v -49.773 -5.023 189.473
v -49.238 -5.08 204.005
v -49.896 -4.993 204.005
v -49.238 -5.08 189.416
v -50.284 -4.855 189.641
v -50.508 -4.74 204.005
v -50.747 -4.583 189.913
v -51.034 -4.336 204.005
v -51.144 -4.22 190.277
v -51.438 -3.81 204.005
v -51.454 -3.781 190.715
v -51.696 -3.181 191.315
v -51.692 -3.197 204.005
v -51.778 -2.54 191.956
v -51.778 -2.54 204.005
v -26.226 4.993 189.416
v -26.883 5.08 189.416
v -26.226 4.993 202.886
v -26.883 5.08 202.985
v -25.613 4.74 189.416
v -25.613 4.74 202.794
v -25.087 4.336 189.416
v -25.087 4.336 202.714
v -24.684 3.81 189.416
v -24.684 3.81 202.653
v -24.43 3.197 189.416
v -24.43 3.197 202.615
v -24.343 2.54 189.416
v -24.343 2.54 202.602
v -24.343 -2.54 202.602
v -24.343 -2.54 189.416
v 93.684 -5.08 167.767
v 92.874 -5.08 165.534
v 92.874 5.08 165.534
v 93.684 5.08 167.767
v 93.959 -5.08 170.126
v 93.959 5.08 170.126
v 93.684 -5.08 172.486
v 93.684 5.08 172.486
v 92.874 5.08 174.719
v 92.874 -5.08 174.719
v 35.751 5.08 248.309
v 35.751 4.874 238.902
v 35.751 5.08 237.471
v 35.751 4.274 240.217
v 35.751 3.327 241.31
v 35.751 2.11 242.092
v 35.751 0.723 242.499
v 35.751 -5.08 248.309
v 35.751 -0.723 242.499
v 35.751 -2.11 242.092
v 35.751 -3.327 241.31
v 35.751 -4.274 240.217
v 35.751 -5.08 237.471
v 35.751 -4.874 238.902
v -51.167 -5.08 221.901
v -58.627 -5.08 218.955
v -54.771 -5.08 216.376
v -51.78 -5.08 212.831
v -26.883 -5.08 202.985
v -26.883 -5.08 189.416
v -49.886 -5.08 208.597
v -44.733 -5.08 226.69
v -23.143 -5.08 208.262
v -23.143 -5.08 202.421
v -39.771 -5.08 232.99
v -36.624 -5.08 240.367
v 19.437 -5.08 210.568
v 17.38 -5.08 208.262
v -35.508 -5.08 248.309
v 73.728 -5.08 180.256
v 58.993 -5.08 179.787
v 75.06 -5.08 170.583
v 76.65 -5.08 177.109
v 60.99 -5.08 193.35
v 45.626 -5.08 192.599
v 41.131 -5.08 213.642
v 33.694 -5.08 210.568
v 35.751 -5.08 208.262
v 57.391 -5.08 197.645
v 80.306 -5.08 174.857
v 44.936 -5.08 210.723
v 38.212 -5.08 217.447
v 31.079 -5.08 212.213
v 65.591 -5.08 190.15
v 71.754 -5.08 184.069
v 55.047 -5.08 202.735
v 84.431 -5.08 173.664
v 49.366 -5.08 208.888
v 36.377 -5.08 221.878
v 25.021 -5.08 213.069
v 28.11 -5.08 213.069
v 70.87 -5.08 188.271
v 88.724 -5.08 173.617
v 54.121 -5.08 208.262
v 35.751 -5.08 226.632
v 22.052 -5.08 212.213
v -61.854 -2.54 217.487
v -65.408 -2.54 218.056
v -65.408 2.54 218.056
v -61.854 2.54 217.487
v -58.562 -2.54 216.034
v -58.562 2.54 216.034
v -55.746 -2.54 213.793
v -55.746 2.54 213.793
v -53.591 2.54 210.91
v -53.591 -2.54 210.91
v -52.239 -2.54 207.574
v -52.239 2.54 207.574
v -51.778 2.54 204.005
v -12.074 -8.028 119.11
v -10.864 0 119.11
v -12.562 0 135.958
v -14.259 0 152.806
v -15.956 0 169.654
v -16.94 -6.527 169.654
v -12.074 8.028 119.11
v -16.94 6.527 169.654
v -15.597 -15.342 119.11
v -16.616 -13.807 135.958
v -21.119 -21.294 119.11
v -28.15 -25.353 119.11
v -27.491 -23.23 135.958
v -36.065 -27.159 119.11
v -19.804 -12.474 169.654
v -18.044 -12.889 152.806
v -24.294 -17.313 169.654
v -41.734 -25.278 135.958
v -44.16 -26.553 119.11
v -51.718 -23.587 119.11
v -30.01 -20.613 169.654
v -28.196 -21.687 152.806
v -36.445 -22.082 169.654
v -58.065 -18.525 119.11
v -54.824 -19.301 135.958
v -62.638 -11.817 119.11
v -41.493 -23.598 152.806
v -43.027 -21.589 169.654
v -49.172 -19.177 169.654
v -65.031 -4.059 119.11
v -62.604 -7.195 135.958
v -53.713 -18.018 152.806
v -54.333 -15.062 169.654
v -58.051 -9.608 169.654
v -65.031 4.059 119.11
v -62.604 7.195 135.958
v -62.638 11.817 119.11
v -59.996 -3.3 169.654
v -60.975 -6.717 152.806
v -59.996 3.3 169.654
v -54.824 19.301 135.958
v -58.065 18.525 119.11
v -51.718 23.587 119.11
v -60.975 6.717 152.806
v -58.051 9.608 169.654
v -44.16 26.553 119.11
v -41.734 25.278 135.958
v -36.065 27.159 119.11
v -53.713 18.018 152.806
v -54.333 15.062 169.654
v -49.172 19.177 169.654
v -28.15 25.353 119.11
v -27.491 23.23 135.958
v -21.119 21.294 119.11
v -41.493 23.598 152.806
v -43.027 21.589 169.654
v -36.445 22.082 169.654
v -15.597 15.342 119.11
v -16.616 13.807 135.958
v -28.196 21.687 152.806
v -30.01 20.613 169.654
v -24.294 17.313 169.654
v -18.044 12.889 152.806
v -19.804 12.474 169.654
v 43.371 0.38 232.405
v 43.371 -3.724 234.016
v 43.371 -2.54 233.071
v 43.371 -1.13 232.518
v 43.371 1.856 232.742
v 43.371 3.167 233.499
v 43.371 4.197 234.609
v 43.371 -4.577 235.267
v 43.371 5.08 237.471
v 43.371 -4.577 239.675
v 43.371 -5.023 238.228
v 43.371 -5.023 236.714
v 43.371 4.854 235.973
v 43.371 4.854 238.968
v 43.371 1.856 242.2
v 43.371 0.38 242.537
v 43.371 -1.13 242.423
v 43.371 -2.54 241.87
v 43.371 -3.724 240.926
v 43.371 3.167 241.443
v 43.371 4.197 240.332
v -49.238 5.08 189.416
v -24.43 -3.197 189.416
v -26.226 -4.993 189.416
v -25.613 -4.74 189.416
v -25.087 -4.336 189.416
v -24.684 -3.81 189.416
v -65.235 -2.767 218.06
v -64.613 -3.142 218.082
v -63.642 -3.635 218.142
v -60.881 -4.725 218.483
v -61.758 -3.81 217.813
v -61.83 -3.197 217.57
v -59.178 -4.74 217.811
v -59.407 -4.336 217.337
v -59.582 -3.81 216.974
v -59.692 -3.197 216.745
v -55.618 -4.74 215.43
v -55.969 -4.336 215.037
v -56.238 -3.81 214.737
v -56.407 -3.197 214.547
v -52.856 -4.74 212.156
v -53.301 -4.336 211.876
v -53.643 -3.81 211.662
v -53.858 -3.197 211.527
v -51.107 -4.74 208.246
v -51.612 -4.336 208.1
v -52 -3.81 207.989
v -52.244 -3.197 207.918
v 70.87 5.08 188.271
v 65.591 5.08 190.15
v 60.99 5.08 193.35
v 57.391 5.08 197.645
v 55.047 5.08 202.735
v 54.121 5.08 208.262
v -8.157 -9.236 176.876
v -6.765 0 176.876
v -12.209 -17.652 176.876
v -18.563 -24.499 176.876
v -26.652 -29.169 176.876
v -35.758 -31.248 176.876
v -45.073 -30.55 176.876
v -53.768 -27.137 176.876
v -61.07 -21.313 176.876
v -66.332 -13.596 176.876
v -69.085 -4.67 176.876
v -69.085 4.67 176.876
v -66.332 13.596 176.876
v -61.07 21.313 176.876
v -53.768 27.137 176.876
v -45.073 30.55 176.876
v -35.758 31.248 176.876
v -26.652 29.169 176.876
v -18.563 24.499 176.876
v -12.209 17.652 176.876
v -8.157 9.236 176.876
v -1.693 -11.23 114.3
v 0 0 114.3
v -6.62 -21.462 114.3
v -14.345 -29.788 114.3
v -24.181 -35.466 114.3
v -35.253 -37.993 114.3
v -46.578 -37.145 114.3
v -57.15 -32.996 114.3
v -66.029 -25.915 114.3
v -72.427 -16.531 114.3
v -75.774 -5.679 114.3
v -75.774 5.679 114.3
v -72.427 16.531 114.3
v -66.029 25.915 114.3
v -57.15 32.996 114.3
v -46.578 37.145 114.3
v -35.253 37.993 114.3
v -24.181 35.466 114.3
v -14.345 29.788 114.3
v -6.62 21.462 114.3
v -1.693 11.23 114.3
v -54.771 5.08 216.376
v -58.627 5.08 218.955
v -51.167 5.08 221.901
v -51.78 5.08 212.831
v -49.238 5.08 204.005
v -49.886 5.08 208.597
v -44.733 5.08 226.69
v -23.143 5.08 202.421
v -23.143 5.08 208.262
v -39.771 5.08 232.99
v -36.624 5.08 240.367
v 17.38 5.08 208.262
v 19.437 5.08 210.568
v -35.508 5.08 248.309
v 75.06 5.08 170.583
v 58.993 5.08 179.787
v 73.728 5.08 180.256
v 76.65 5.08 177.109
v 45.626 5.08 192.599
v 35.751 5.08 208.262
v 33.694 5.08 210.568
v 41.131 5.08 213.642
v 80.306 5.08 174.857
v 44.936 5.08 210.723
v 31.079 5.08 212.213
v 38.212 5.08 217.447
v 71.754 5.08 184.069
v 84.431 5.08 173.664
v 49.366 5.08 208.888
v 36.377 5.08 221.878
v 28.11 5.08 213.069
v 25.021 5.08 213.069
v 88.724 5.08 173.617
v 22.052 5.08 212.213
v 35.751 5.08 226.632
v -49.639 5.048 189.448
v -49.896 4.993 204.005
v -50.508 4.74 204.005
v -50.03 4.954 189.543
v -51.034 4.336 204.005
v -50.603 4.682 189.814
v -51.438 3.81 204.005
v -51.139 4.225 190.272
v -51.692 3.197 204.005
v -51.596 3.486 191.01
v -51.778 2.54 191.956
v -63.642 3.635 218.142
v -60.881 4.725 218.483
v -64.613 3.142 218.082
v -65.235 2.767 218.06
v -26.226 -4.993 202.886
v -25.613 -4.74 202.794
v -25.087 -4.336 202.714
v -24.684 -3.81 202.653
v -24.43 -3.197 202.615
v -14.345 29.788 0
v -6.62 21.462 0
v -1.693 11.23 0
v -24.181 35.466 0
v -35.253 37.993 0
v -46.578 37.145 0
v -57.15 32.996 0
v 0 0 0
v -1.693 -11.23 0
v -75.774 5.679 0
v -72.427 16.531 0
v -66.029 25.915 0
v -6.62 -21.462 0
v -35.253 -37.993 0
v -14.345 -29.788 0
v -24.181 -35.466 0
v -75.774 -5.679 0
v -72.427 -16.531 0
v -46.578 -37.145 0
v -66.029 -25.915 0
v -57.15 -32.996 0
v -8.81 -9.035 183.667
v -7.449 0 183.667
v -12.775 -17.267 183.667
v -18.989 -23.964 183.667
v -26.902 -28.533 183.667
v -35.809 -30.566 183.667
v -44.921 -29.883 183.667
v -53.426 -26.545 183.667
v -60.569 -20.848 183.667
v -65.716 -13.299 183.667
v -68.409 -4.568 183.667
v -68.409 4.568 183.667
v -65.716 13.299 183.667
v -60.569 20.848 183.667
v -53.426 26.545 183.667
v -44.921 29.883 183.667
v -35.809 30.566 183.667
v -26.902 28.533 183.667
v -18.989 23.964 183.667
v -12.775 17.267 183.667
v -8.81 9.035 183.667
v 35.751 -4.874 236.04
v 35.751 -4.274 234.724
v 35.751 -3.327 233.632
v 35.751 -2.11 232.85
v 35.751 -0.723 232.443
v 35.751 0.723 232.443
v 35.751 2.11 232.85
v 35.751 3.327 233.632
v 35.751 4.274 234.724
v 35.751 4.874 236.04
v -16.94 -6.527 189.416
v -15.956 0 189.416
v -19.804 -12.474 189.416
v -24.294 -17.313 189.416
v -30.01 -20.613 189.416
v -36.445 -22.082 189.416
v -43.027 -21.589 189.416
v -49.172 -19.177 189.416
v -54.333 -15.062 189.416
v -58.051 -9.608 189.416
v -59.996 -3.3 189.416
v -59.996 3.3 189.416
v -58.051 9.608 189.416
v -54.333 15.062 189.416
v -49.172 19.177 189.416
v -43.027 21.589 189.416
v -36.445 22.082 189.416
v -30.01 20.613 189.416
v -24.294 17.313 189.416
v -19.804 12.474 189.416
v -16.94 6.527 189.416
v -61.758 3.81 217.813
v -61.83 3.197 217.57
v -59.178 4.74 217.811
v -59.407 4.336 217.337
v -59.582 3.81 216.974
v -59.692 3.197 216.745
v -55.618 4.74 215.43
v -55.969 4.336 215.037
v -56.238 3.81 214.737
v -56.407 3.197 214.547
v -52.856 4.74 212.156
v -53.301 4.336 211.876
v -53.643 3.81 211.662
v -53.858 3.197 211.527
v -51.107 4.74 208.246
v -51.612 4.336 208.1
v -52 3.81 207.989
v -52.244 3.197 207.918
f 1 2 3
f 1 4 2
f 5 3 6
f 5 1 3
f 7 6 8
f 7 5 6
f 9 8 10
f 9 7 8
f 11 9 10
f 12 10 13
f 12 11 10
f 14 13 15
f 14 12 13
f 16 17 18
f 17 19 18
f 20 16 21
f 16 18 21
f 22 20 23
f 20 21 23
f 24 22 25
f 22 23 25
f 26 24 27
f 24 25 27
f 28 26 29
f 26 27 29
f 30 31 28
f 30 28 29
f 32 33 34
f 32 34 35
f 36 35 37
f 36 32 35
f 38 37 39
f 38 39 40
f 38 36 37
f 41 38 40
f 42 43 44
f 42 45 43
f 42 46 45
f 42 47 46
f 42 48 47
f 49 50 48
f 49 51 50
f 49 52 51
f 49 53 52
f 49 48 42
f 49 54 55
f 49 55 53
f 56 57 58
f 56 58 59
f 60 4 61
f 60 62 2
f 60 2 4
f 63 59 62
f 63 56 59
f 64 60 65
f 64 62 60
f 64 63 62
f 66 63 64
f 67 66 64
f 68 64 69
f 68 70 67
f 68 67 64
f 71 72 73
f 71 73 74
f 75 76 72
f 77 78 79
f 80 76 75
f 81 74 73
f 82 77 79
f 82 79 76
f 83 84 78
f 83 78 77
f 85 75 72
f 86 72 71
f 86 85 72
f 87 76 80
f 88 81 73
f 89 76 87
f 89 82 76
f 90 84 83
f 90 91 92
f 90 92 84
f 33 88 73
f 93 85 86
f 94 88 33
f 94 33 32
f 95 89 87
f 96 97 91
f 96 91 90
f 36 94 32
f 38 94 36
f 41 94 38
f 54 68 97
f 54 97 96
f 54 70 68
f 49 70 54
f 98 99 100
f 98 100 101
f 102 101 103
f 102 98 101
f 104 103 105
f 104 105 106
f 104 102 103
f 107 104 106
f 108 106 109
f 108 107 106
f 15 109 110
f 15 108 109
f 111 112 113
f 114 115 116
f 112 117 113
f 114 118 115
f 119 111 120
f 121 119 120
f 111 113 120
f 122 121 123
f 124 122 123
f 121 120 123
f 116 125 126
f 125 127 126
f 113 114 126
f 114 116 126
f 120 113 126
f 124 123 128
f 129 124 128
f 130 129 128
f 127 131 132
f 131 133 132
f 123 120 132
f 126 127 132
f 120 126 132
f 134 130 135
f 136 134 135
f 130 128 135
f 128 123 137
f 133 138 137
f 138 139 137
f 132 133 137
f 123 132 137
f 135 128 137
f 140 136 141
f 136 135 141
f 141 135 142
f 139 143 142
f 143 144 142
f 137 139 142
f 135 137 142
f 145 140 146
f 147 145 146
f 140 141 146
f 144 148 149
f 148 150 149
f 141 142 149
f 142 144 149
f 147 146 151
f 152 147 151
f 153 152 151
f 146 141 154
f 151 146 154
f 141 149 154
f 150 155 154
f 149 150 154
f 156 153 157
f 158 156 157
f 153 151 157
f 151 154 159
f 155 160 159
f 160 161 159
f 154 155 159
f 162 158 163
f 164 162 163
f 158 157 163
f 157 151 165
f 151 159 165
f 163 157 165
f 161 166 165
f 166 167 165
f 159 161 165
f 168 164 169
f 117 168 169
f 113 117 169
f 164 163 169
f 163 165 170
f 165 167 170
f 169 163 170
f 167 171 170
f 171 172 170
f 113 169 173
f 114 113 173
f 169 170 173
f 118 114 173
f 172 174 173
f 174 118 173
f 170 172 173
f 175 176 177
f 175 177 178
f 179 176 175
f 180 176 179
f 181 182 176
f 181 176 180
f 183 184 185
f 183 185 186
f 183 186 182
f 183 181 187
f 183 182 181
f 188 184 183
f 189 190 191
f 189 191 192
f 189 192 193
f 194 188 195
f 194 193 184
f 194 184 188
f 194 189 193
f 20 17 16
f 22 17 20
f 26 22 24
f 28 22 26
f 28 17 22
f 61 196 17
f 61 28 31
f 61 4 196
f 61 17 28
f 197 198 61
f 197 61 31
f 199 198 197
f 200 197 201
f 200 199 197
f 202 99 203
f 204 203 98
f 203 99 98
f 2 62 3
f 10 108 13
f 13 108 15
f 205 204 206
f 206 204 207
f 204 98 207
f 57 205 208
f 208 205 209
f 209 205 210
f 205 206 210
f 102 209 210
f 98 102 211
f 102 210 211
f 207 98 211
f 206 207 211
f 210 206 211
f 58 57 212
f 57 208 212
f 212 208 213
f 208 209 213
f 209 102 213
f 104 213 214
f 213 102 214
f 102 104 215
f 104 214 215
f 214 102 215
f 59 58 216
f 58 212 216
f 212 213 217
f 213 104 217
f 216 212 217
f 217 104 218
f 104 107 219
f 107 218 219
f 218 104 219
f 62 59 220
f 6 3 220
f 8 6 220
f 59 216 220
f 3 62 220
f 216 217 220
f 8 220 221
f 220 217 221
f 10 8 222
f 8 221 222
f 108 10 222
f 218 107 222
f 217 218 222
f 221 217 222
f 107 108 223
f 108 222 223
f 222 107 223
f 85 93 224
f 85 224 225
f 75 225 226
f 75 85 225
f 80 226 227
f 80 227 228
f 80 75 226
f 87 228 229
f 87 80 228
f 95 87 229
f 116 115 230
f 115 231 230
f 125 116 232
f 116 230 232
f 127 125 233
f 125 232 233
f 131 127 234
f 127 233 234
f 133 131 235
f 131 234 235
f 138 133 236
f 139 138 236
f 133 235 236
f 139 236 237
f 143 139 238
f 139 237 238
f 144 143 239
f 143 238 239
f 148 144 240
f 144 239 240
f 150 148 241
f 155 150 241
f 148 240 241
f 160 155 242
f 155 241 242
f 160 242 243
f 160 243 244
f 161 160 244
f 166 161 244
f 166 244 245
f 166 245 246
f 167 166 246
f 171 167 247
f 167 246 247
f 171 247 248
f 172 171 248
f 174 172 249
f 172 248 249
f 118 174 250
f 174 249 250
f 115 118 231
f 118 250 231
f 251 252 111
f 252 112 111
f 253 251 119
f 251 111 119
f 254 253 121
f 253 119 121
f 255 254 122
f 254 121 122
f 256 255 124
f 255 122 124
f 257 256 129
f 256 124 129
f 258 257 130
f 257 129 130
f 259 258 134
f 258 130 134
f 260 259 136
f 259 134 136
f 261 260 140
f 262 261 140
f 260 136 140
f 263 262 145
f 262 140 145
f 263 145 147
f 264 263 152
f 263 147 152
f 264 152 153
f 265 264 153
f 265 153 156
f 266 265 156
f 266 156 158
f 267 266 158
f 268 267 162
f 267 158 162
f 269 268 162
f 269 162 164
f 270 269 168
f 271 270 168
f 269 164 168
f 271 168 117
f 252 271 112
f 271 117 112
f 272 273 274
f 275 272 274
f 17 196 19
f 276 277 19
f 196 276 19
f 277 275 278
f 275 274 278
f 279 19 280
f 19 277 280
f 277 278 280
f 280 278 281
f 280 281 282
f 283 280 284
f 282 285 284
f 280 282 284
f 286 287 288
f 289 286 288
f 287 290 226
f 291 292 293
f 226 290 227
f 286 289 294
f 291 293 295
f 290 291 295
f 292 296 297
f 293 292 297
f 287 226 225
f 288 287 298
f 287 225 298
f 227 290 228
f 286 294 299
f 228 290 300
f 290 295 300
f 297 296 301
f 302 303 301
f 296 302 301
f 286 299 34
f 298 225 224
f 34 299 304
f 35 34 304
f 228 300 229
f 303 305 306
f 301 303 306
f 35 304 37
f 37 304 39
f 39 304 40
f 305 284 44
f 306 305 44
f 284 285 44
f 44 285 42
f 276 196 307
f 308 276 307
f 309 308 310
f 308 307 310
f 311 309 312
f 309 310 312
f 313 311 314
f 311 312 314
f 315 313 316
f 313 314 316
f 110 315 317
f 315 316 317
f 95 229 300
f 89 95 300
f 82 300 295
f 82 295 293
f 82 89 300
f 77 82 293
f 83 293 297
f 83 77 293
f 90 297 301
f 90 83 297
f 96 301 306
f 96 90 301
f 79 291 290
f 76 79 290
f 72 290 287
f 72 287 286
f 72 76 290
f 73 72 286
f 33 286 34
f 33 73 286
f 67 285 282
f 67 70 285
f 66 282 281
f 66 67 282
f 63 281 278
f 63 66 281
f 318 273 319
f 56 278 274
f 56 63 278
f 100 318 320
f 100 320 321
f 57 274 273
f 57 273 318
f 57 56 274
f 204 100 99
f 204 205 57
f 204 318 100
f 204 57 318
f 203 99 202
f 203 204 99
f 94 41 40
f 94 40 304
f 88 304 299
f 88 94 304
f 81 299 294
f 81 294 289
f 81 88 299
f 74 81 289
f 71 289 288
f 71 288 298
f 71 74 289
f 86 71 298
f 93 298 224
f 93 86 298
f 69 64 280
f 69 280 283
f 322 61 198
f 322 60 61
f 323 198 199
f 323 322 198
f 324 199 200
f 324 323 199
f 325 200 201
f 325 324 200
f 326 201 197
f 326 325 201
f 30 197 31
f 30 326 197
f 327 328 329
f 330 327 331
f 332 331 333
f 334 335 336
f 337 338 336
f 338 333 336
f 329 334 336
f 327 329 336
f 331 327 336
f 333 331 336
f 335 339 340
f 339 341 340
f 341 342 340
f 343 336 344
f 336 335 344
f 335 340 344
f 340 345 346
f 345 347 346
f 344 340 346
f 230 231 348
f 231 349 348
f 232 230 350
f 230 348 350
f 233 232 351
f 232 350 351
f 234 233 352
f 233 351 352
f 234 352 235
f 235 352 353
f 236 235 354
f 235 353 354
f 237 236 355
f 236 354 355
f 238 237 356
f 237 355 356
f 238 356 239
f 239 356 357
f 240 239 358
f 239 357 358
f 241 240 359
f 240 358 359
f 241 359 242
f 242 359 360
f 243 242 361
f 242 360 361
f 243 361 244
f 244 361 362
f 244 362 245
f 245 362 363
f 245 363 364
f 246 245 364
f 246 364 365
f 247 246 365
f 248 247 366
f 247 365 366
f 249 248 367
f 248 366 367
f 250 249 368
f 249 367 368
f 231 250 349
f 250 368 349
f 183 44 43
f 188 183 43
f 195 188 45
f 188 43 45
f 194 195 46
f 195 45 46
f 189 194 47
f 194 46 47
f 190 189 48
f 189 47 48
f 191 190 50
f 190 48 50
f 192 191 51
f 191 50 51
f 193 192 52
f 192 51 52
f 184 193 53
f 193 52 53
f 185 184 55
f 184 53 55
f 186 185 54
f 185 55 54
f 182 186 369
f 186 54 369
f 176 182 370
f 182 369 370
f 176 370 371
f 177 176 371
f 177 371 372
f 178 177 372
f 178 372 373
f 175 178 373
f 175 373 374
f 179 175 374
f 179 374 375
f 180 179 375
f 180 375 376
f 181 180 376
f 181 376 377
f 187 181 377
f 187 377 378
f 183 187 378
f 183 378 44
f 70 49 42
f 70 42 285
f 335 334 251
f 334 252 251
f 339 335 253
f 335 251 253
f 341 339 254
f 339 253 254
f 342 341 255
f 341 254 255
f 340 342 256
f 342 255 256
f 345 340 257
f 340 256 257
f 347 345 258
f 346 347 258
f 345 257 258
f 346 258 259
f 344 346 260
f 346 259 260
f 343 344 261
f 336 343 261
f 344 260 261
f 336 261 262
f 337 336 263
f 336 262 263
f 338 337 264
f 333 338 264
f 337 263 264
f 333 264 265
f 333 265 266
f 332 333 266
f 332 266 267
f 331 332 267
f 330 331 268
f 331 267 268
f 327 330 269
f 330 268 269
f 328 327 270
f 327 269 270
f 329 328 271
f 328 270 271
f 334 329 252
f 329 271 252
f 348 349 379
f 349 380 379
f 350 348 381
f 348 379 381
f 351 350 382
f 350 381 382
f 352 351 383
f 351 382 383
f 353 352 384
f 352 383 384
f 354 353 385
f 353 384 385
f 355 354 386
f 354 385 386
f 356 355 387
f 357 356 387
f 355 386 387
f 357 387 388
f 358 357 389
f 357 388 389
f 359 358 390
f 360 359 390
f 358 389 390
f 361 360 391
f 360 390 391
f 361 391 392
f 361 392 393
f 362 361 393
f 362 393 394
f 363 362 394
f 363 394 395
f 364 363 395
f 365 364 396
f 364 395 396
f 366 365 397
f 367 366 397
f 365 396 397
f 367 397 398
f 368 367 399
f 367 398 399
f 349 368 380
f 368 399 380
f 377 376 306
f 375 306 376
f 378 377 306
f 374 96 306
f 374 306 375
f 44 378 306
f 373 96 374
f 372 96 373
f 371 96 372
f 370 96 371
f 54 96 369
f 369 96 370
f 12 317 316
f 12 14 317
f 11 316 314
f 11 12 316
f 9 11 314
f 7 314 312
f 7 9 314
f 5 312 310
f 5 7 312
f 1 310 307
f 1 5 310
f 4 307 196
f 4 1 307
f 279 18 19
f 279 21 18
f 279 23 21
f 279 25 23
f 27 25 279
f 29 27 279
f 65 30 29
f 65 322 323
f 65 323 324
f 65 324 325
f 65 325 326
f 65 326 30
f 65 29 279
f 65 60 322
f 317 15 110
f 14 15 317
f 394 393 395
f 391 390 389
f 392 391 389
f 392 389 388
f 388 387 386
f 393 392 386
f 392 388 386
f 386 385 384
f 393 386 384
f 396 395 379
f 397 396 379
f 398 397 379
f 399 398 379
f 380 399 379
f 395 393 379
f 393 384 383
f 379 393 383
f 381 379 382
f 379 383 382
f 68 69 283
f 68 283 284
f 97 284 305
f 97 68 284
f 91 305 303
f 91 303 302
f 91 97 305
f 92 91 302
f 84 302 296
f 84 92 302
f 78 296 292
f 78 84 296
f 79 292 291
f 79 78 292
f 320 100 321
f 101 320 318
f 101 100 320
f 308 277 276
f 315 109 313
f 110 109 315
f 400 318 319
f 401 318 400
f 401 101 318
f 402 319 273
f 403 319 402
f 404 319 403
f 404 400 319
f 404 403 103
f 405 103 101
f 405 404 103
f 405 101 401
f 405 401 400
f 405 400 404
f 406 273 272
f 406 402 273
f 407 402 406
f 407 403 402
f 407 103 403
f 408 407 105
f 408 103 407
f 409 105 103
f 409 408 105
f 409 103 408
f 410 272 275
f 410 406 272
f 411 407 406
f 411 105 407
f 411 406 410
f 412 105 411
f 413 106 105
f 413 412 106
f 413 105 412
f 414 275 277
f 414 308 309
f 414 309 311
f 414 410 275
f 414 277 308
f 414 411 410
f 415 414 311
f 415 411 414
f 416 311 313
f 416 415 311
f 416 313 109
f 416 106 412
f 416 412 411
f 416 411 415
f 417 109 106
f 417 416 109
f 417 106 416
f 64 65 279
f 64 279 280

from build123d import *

# Parameters (mm, degrees)
F3_DEPTH      = 5.08
F3_DEPTH_BACK = 5.08
F4_R          = 5.08
F5_DEPTH      = 7.62
F6_R          = 2.54


with BuildPart() as f1:
    # F0 (on Front) → F1 (revolve)
    with BuildSketch(Plane.XZ):
        Polygon((-38.1, 0), (0, 0), (0, 114.3), (-10.86447, 119.110203), (-15.956199, 169.654384), (-6.764589, 176.87637), (-7.448647, 183.666825), (-15.956199, 189.41646), (-38.1, 189.41646), (-38.1, 176.226493), (-38.1, 114.3), align=None)
    revolve(axis=Axis((-38.1, 0, 57.15), (0, 0, -1)))


with BuildPart() as f3:
    # F2 (on Front) → F3 (new body, two sides)
    with BuildSketch(Plane.XZ) as f3_sk:
        with BuildLine():
            Line((-51.778354, 204.004637), (-51.778354, 189.41646))
            Line((-51.778354, 189.41646), (-24.343233, 189.41646))
            Line((-24.343233, 189.41646), (-24.343233, 202.601971))
            Line((-24.343233, 202.601971), (-23.142859, 202.42082))
            Line((-23.142859, 202.42082), (-23.142859, 208.261922))
            Line((-23.142859, 208.261922), (17.380379, 208.261922))
            ThreePointArc((17.380379, 208.261922), (26.565524, 213.17765), (35.750668, 208.261922))
            ThreePointArc((35.750668, 208.261922), (58.993407, 179.786642), (92.874424, 165.533812))
            ThreePointArc((92.874424, 165.533812), (93.958588, 170.126387), (92.874424, 174.718962))
            ThreePointArc((92.874424, 174.718962), (78.401587, 175.859285), (70.87034, 188.270718))
            ThreePointArc((70.87034, 188.270718), (59.047853, 195.377632), (54.120939, 208.261922))
            ThreePointArc((54.120939, 208.261922), (41.131196, 213.64245), (35.750668, 226.632193))
            Line((35.750668, 226.632193), (35.750668, 241.22037))
            Line((35.750668, 241.22037), (35.750668, 248.30944))
            Line((35.750668, 248.30944), (-35.508399, 248.30944))
            ThreePointArc((-35.508399, 248.30944), (-44.311775, 227.107968), (-65.408304, 218.05599))
            ThreePointArc((-65.408304, 218.05599), (-55.74565, 213.792589), (-51.778354, 204.004637))
        make_face()
    extrude(amount=F3_DEPTH)
    extrude(f3_sk.sketch, amount=-F3_DEPTH_BACK)

    # F4 (on face) → F5 (join)
    with BuildSketch(Plane.YZ.offset(35.750668)):
        with Locations((0, 237.470816)):
            Circle(F4_R)
    extrude(amount=F5_DEPTH)

    # F6
    f6_edges = [f3.edges().sort_by_distance(p)[0] for p in [
        (-51.778354, -5.08, 196.710548),
        (-51.778354, 0, 189.41646),
        (-51.778354, 5.08, 196.710548),
        (-51.778354, 0, 204.004637),
        (-24.343233, 5.08, 196.009215),
        (-24.343233, -5.08, 196.009215),
    ]]
    fillet(f6_edges, radius=F6_R)


solid = Compound([f1.part, f3.part])
